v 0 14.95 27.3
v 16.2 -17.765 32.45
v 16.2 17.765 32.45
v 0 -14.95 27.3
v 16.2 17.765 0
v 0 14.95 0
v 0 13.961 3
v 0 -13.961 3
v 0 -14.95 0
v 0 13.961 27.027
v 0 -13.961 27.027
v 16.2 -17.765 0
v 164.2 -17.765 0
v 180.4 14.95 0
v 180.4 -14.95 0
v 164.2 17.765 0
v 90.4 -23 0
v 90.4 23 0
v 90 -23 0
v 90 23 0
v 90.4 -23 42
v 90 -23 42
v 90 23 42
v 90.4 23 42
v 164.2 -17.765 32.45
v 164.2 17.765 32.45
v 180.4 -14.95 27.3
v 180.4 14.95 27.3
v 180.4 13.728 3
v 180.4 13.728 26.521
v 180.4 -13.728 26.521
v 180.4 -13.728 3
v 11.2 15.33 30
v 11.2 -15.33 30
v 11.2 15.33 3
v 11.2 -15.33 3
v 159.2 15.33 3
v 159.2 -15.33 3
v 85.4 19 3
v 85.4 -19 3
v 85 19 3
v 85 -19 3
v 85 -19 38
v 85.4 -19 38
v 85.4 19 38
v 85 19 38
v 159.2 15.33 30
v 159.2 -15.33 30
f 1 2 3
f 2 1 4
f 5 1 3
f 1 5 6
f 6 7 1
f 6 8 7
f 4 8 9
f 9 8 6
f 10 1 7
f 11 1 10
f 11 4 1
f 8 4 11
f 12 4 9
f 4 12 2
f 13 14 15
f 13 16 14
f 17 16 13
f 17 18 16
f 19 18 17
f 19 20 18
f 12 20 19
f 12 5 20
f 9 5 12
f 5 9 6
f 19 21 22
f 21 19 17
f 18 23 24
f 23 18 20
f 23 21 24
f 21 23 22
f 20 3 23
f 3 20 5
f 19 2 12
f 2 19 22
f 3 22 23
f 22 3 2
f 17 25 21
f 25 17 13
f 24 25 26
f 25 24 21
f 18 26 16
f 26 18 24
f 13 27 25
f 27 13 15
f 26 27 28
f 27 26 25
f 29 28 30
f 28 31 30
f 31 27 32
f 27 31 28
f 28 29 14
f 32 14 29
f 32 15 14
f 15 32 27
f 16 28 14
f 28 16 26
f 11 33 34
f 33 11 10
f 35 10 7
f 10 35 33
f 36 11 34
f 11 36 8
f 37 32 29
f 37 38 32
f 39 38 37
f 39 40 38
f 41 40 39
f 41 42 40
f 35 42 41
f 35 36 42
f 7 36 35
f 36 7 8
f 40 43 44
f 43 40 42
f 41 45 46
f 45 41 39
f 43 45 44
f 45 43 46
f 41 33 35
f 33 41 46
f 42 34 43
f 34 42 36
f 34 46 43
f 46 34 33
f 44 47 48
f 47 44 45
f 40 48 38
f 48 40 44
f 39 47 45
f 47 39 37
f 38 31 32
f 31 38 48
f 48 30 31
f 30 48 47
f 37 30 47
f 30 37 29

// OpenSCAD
$fn = 32;

// ----------------------------------------------------------------------
// Faired channel: 180 x 46 x 42 mm, 4 mm walls, faired ends
// ----------------------------------------------------------------------

// --- parameters (mm) ---
length = 180;             // channel length
width = 46;               // channel width at mid length
height = 42;              // channel height at mid length
wall = 4;                 // side wall thickness
floor_t = 3;              // floor thickness
end_w = 29.9;             // faired end width
end_h = 27.3;             // faired end height

difference() {
  union() {
    hull() {
      translate([0, -14.95, 0]) cube([0.4, 29.9, 27.3]);
      translate([16.2, -17.765, 0]) cube([0.4, 35.53, 32.45]);
    }
    hull() {
      translate([16.2, -17.765, 0]) cube([0.4, 35.53, 32.45]);
      translate([90, -23, 0]) cube([0.4, 46, 42]);
    }
    hull() {
      translate([90, -23, 0]) cube([0.4, 46, 42]);
      translate([163.8, -17.765, 0]) cube([0.4, 35.53, 32.45]);
    }
    hull() {
      translate([163.8, -17.765, 0]) cube([0.4, 35.53, 32.45]);
      translate([180, -14.95, 0]) cube([0.4, 29.9, 27.3]);
    }
  }
  /* cavity, 5 mm proud of both ends so the ports are cut clean */
  hull() {
    translate([-5, -13.35, 3]) cube([0.4, 26.7, 22.7]);
    translate([11.2, -15.33, 3]) cube([0.4, 30.66, 27]);
  }
  hull() {
    translate([11.2, -15.33, 3]) cube([0.4, 30.66, 27]);
    translate([85, -19, 3]) cube([0.4, 38, 35]);
  }
  hull() {
    translate([85, -19, 3]) cube([0.4, 38, 35]);
    translate([158.8, -15.33, 3]) cube([0.4, 30.66, 27]);
  }
  hull() {
    translate([158.8, -15.33, 3]) cube([0.4, 30.66, 27]);
    translate([185, -13.35, 3]) cube([0.4, 26.7, 22.7]);
  }
}
